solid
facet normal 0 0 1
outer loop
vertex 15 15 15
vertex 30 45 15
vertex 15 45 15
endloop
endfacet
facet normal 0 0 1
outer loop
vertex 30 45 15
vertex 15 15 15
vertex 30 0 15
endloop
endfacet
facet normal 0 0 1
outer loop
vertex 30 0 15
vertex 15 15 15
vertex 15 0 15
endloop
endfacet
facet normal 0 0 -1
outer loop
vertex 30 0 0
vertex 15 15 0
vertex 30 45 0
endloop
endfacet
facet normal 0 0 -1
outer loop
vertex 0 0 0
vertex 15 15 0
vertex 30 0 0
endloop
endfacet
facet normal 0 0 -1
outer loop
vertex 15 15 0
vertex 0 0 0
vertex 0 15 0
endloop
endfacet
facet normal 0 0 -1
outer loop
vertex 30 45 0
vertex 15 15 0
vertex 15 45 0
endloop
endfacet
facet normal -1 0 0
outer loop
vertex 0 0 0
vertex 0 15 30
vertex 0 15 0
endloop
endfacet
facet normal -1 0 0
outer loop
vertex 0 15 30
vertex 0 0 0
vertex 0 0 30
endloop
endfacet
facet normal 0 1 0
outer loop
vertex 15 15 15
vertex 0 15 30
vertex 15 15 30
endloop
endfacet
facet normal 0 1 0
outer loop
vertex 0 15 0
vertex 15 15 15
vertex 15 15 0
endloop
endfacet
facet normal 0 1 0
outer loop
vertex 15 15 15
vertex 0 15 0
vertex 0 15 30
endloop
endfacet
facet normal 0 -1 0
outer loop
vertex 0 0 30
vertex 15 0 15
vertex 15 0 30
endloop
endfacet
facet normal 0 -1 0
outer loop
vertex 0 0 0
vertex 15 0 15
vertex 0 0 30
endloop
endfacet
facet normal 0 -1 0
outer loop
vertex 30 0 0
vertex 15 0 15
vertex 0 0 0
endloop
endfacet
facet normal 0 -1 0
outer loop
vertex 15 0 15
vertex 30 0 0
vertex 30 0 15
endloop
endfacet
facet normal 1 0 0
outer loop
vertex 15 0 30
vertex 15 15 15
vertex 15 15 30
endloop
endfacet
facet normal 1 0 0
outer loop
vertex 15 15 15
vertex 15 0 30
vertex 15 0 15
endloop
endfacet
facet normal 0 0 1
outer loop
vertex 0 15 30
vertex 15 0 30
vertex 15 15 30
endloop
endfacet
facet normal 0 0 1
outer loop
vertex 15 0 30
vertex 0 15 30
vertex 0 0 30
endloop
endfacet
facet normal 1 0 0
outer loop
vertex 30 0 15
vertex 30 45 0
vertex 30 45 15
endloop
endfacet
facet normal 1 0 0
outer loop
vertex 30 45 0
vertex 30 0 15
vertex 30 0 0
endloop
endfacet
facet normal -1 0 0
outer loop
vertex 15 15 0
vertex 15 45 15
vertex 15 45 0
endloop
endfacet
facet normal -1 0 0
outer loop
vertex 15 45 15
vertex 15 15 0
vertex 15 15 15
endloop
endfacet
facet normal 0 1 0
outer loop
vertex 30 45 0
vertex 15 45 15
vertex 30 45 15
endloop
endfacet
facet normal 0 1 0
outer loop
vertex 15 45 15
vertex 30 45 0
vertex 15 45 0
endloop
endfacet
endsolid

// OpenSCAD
// Fongo piece 5: Raised hook. GPL-3.0; see README.txt.
// All cube positions derive from the canonical catalogue. z points up.
unit = 15; // mm, scale all pieces AND cards together
positions = [[0,0,0],[0,0,1],[1,0,0],[1,1,0],[1,2,0]];
union() { for (p = positions) translate(p * unit) cube([unit, unit, unit]); }
